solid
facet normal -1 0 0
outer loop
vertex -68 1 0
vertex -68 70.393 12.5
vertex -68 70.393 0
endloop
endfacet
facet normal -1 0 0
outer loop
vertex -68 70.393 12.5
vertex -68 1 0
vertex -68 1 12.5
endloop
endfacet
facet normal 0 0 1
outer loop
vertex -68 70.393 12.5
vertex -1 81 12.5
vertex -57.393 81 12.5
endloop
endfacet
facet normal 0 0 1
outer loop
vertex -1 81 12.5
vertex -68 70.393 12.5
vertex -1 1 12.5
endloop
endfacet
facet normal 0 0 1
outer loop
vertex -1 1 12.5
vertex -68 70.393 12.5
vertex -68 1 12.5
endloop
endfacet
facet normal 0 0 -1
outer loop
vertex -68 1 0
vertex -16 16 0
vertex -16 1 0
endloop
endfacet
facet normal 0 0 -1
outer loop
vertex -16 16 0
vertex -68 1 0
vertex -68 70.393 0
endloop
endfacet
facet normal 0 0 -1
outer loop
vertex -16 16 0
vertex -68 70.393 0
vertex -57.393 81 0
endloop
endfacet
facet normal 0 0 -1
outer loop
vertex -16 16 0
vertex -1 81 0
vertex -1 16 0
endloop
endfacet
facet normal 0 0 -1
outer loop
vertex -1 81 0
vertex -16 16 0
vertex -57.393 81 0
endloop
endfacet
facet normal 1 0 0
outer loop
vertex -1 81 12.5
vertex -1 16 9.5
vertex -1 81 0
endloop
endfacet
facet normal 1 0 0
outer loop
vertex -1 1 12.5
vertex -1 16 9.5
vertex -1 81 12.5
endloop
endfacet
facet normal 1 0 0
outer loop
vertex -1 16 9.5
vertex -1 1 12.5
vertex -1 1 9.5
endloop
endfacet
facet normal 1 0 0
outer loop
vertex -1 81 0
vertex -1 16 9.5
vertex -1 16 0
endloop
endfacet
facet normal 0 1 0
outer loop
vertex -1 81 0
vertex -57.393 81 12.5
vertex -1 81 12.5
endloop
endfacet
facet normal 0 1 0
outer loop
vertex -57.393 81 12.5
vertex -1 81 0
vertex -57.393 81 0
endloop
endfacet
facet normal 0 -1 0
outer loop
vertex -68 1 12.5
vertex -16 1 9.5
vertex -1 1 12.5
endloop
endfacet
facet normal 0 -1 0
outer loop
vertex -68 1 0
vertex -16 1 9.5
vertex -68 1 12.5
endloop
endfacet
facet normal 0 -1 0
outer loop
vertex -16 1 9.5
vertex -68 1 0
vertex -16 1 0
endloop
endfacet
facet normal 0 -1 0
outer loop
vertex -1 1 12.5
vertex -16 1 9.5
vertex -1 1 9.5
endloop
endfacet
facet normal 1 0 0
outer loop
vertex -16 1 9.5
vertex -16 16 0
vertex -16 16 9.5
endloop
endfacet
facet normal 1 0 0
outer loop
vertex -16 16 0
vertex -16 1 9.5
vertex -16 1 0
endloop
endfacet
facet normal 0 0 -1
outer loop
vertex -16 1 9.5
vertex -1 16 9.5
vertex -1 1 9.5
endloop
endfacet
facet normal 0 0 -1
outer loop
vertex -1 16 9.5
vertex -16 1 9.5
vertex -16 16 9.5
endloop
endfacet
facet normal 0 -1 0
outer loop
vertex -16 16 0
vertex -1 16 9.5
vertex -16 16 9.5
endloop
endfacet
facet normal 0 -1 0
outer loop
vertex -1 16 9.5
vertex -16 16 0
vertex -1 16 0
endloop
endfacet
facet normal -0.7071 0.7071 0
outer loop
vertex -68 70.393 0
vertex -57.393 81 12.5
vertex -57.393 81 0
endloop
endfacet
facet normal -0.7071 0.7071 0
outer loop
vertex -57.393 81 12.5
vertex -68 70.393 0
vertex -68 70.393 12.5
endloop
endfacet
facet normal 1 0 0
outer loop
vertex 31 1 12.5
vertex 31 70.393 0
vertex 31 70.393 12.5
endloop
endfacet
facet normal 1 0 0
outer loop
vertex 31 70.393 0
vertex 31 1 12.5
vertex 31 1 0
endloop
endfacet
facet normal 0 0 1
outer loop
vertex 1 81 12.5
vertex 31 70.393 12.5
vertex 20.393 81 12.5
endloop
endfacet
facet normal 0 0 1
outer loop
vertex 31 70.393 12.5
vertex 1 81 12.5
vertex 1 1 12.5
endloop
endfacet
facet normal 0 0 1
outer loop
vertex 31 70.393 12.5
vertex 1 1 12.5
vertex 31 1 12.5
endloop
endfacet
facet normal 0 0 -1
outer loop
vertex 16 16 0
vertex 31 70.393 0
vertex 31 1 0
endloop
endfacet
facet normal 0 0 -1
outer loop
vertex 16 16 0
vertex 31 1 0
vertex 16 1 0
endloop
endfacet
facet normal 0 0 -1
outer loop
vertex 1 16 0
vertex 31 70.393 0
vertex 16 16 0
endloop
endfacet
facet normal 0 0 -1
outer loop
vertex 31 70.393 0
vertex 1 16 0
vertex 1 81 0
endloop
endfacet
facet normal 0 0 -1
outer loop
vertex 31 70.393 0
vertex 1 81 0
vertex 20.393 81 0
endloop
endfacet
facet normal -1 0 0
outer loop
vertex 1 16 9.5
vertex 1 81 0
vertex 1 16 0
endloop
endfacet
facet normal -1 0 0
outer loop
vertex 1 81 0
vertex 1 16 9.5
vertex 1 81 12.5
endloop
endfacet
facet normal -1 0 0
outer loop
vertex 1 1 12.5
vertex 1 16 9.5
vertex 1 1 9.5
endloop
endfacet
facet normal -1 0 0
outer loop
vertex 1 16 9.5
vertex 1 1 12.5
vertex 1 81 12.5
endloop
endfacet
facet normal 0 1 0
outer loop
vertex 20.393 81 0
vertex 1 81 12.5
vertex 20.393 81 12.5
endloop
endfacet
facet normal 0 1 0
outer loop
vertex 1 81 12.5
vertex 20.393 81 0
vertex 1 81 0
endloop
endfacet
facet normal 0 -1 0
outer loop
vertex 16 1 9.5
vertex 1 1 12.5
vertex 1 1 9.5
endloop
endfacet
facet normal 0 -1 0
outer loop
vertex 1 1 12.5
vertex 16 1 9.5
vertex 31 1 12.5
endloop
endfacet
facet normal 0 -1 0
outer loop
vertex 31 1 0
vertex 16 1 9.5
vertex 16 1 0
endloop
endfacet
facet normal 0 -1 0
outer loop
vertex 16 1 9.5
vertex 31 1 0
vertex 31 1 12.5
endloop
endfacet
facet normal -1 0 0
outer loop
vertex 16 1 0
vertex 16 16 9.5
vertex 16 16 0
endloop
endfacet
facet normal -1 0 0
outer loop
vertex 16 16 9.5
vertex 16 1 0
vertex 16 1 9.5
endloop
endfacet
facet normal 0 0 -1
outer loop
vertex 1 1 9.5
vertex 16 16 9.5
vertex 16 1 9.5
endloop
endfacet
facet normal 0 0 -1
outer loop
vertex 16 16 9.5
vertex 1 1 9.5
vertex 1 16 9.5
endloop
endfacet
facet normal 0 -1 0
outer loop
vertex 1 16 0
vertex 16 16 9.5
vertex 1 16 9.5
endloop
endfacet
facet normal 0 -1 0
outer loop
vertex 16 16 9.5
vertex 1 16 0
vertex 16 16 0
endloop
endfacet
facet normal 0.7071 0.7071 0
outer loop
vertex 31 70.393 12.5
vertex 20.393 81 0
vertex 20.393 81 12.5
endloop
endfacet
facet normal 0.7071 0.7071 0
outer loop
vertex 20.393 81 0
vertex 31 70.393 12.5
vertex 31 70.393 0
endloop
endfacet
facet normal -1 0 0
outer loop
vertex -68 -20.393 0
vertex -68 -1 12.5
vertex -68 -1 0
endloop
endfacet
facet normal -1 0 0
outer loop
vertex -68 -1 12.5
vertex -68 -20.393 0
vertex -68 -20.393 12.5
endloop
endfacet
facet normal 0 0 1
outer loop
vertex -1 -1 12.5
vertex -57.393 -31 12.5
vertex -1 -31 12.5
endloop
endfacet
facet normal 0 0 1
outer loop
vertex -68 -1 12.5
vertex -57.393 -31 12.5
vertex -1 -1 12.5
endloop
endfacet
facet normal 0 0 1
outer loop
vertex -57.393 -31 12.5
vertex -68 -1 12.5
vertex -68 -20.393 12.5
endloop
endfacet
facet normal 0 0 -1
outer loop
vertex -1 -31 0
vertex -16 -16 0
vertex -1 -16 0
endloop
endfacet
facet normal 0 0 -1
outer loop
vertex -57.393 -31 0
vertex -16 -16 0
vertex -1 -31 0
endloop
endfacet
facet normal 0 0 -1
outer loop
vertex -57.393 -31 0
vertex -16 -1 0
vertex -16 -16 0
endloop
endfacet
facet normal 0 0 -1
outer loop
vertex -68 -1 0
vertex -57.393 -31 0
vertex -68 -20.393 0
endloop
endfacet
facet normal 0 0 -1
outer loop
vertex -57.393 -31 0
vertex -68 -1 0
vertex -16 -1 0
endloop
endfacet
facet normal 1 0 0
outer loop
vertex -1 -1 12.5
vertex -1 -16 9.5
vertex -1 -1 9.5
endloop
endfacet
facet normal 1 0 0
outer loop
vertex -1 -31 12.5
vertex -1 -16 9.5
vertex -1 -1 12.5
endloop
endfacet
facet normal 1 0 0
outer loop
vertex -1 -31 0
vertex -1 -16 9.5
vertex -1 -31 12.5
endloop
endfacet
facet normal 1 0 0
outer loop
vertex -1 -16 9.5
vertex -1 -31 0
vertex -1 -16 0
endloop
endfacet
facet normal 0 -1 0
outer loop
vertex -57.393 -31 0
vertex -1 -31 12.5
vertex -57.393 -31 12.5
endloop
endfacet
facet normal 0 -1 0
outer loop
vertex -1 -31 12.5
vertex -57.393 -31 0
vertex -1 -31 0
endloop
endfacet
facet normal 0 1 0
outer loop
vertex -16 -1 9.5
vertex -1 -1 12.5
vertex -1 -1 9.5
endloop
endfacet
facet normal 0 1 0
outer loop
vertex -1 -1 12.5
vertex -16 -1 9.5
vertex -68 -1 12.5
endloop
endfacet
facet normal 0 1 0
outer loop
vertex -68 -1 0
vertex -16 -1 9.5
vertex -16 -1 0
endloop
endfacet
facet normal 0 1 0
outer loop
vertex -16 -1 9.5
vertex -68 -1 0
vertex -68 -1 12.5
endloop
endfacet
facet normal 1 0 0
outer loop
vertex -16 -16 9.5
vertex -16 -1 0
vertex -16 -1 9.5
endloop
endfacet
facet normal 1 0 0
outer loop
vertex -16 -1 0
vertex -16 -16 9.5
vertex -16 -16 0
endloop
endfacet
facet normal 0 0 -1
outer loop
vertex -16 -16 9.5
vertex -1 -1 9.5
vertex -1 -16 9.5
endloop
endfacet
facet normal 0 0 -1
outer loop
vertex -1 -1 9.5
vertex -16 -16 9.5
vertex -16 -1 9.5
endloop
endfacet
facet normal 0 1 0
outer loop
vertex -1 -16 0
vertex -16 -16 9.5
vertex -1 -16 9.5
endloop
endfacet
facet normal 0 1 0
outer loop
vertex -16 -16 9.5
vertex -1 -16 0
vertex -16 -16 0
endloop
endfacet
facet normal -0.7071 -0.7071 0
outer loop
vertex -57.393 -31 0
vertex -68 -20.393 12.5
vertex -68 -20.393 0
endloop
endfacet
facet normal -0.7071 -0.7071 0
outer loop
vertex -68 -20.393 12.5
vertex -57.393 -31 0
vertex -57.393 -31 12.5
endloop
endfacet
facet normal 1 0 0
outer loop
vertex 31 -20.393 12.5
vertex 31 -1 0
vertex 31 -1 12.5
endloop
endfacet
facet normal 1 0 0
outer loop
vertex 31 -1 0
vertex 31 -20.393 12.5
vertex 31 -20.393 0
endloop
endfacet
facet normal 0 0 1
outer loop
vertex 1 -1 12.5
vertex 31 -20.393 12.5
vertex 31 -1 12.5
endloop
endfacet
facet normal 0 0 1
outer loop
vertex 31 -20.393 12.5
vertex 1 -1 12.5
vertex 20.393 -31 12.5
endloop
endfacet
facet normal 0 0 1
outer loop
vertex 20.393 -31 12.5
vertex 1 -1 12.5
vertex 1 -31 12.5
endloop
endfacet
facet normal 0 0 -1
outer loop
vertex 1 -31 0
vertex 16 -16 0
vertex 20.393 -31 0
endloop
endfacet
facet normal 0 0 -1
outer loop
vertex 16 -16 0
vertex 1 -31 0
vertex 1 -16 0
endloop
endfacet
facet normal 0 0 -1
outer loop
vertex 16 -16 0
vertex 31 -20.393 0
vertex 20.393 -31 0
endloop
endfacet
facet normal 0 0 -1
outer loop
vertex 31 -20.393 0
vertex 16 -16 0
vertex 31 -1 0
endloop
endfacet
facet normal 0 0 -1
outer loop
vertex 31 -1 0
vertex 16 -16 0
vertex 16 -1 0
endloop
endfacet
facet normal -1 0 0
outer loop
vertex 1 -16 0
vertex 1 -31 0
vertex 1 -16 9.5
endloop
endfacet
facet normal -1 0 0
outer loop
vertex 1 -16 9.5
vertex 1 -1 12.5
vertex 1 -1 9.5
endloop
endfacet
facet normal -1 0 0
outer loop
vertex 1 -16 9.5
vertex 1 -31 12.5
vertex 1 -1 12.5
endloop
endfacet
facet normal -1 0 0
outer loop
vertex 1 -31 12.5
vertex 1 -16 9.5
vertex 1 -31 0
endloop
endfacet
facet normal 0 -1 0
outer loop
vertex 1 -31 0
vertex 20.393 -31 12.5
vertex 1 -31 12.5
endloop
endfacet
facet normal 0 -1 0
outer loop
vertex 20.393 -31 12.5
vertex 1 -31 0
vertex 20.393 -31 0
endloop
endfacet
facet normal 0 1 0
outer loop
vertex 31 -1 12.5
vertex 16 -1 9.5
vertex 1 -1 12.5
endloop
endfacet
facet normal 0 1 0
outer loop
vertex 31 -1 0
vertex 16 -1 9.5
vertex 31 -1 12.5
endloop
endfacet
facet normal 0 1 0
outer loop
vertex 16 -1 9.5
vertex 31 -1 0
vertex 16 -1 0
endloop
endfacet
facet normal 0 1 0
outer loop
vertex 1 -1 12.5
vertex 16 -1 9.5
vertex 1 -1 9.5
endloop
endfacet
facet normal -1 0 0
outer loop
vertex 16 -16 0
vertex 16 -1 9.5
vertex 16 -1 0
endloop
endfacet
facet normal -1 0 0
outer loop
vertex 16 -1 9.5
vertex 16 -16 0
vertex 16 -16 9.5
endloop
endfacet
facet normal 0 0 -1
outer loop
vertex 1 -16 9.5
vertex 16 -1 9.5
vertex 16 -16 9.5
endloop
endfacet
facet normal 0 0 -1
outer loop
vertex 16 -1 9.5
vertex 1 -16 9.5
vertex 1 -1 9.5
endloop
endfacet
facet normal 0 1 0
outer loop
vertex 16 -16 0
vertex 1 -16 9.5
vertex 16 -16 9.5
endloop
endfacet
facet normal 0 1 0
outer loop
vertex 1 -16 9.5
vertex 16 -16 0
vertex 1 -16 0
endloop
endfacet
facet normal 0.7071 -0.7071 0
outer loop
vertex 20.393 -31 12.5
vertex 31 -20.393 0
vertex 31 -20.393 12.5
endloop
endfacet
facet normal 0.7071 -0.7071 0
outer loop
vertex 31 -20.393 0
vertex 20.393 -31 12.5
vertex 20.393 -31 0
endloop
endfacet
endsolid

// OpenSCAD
right = 15;
left = 52;
top = 65;
bottom = 15;
overlay = 15;
depth = 9.5;
extension = 15;
height = 3;
corner = 15;

function invert(a) = abs(a-1);

module Corner(side1,side2,spacer){
    difference(){
        cube([side1+extension,side2+extension,(depth*invert(spacer))+height]);
        translate([-1,-1,-1]) cube([overlay+1,overlay+1,(depth*invert(spacer))+(height*spacer)+1+spacer]);
        translate([side1+extension,side2+extension,((depth+height+2)/2)-1]) rotate([0,0,45]) cube([corner,corner,depth+height+2],center=true);
    }
}


mirror() translate([1,1,0]) Corner(left,top,0);
translate([1,1,0]) Corner(right,top,0);
rotate([0,0,180]) translate([1,1,0]) Corner(left,bottom,0);
rotate([0,0,180]) mirror() translate([1,1,0]) Corner(right,bottom,0);
